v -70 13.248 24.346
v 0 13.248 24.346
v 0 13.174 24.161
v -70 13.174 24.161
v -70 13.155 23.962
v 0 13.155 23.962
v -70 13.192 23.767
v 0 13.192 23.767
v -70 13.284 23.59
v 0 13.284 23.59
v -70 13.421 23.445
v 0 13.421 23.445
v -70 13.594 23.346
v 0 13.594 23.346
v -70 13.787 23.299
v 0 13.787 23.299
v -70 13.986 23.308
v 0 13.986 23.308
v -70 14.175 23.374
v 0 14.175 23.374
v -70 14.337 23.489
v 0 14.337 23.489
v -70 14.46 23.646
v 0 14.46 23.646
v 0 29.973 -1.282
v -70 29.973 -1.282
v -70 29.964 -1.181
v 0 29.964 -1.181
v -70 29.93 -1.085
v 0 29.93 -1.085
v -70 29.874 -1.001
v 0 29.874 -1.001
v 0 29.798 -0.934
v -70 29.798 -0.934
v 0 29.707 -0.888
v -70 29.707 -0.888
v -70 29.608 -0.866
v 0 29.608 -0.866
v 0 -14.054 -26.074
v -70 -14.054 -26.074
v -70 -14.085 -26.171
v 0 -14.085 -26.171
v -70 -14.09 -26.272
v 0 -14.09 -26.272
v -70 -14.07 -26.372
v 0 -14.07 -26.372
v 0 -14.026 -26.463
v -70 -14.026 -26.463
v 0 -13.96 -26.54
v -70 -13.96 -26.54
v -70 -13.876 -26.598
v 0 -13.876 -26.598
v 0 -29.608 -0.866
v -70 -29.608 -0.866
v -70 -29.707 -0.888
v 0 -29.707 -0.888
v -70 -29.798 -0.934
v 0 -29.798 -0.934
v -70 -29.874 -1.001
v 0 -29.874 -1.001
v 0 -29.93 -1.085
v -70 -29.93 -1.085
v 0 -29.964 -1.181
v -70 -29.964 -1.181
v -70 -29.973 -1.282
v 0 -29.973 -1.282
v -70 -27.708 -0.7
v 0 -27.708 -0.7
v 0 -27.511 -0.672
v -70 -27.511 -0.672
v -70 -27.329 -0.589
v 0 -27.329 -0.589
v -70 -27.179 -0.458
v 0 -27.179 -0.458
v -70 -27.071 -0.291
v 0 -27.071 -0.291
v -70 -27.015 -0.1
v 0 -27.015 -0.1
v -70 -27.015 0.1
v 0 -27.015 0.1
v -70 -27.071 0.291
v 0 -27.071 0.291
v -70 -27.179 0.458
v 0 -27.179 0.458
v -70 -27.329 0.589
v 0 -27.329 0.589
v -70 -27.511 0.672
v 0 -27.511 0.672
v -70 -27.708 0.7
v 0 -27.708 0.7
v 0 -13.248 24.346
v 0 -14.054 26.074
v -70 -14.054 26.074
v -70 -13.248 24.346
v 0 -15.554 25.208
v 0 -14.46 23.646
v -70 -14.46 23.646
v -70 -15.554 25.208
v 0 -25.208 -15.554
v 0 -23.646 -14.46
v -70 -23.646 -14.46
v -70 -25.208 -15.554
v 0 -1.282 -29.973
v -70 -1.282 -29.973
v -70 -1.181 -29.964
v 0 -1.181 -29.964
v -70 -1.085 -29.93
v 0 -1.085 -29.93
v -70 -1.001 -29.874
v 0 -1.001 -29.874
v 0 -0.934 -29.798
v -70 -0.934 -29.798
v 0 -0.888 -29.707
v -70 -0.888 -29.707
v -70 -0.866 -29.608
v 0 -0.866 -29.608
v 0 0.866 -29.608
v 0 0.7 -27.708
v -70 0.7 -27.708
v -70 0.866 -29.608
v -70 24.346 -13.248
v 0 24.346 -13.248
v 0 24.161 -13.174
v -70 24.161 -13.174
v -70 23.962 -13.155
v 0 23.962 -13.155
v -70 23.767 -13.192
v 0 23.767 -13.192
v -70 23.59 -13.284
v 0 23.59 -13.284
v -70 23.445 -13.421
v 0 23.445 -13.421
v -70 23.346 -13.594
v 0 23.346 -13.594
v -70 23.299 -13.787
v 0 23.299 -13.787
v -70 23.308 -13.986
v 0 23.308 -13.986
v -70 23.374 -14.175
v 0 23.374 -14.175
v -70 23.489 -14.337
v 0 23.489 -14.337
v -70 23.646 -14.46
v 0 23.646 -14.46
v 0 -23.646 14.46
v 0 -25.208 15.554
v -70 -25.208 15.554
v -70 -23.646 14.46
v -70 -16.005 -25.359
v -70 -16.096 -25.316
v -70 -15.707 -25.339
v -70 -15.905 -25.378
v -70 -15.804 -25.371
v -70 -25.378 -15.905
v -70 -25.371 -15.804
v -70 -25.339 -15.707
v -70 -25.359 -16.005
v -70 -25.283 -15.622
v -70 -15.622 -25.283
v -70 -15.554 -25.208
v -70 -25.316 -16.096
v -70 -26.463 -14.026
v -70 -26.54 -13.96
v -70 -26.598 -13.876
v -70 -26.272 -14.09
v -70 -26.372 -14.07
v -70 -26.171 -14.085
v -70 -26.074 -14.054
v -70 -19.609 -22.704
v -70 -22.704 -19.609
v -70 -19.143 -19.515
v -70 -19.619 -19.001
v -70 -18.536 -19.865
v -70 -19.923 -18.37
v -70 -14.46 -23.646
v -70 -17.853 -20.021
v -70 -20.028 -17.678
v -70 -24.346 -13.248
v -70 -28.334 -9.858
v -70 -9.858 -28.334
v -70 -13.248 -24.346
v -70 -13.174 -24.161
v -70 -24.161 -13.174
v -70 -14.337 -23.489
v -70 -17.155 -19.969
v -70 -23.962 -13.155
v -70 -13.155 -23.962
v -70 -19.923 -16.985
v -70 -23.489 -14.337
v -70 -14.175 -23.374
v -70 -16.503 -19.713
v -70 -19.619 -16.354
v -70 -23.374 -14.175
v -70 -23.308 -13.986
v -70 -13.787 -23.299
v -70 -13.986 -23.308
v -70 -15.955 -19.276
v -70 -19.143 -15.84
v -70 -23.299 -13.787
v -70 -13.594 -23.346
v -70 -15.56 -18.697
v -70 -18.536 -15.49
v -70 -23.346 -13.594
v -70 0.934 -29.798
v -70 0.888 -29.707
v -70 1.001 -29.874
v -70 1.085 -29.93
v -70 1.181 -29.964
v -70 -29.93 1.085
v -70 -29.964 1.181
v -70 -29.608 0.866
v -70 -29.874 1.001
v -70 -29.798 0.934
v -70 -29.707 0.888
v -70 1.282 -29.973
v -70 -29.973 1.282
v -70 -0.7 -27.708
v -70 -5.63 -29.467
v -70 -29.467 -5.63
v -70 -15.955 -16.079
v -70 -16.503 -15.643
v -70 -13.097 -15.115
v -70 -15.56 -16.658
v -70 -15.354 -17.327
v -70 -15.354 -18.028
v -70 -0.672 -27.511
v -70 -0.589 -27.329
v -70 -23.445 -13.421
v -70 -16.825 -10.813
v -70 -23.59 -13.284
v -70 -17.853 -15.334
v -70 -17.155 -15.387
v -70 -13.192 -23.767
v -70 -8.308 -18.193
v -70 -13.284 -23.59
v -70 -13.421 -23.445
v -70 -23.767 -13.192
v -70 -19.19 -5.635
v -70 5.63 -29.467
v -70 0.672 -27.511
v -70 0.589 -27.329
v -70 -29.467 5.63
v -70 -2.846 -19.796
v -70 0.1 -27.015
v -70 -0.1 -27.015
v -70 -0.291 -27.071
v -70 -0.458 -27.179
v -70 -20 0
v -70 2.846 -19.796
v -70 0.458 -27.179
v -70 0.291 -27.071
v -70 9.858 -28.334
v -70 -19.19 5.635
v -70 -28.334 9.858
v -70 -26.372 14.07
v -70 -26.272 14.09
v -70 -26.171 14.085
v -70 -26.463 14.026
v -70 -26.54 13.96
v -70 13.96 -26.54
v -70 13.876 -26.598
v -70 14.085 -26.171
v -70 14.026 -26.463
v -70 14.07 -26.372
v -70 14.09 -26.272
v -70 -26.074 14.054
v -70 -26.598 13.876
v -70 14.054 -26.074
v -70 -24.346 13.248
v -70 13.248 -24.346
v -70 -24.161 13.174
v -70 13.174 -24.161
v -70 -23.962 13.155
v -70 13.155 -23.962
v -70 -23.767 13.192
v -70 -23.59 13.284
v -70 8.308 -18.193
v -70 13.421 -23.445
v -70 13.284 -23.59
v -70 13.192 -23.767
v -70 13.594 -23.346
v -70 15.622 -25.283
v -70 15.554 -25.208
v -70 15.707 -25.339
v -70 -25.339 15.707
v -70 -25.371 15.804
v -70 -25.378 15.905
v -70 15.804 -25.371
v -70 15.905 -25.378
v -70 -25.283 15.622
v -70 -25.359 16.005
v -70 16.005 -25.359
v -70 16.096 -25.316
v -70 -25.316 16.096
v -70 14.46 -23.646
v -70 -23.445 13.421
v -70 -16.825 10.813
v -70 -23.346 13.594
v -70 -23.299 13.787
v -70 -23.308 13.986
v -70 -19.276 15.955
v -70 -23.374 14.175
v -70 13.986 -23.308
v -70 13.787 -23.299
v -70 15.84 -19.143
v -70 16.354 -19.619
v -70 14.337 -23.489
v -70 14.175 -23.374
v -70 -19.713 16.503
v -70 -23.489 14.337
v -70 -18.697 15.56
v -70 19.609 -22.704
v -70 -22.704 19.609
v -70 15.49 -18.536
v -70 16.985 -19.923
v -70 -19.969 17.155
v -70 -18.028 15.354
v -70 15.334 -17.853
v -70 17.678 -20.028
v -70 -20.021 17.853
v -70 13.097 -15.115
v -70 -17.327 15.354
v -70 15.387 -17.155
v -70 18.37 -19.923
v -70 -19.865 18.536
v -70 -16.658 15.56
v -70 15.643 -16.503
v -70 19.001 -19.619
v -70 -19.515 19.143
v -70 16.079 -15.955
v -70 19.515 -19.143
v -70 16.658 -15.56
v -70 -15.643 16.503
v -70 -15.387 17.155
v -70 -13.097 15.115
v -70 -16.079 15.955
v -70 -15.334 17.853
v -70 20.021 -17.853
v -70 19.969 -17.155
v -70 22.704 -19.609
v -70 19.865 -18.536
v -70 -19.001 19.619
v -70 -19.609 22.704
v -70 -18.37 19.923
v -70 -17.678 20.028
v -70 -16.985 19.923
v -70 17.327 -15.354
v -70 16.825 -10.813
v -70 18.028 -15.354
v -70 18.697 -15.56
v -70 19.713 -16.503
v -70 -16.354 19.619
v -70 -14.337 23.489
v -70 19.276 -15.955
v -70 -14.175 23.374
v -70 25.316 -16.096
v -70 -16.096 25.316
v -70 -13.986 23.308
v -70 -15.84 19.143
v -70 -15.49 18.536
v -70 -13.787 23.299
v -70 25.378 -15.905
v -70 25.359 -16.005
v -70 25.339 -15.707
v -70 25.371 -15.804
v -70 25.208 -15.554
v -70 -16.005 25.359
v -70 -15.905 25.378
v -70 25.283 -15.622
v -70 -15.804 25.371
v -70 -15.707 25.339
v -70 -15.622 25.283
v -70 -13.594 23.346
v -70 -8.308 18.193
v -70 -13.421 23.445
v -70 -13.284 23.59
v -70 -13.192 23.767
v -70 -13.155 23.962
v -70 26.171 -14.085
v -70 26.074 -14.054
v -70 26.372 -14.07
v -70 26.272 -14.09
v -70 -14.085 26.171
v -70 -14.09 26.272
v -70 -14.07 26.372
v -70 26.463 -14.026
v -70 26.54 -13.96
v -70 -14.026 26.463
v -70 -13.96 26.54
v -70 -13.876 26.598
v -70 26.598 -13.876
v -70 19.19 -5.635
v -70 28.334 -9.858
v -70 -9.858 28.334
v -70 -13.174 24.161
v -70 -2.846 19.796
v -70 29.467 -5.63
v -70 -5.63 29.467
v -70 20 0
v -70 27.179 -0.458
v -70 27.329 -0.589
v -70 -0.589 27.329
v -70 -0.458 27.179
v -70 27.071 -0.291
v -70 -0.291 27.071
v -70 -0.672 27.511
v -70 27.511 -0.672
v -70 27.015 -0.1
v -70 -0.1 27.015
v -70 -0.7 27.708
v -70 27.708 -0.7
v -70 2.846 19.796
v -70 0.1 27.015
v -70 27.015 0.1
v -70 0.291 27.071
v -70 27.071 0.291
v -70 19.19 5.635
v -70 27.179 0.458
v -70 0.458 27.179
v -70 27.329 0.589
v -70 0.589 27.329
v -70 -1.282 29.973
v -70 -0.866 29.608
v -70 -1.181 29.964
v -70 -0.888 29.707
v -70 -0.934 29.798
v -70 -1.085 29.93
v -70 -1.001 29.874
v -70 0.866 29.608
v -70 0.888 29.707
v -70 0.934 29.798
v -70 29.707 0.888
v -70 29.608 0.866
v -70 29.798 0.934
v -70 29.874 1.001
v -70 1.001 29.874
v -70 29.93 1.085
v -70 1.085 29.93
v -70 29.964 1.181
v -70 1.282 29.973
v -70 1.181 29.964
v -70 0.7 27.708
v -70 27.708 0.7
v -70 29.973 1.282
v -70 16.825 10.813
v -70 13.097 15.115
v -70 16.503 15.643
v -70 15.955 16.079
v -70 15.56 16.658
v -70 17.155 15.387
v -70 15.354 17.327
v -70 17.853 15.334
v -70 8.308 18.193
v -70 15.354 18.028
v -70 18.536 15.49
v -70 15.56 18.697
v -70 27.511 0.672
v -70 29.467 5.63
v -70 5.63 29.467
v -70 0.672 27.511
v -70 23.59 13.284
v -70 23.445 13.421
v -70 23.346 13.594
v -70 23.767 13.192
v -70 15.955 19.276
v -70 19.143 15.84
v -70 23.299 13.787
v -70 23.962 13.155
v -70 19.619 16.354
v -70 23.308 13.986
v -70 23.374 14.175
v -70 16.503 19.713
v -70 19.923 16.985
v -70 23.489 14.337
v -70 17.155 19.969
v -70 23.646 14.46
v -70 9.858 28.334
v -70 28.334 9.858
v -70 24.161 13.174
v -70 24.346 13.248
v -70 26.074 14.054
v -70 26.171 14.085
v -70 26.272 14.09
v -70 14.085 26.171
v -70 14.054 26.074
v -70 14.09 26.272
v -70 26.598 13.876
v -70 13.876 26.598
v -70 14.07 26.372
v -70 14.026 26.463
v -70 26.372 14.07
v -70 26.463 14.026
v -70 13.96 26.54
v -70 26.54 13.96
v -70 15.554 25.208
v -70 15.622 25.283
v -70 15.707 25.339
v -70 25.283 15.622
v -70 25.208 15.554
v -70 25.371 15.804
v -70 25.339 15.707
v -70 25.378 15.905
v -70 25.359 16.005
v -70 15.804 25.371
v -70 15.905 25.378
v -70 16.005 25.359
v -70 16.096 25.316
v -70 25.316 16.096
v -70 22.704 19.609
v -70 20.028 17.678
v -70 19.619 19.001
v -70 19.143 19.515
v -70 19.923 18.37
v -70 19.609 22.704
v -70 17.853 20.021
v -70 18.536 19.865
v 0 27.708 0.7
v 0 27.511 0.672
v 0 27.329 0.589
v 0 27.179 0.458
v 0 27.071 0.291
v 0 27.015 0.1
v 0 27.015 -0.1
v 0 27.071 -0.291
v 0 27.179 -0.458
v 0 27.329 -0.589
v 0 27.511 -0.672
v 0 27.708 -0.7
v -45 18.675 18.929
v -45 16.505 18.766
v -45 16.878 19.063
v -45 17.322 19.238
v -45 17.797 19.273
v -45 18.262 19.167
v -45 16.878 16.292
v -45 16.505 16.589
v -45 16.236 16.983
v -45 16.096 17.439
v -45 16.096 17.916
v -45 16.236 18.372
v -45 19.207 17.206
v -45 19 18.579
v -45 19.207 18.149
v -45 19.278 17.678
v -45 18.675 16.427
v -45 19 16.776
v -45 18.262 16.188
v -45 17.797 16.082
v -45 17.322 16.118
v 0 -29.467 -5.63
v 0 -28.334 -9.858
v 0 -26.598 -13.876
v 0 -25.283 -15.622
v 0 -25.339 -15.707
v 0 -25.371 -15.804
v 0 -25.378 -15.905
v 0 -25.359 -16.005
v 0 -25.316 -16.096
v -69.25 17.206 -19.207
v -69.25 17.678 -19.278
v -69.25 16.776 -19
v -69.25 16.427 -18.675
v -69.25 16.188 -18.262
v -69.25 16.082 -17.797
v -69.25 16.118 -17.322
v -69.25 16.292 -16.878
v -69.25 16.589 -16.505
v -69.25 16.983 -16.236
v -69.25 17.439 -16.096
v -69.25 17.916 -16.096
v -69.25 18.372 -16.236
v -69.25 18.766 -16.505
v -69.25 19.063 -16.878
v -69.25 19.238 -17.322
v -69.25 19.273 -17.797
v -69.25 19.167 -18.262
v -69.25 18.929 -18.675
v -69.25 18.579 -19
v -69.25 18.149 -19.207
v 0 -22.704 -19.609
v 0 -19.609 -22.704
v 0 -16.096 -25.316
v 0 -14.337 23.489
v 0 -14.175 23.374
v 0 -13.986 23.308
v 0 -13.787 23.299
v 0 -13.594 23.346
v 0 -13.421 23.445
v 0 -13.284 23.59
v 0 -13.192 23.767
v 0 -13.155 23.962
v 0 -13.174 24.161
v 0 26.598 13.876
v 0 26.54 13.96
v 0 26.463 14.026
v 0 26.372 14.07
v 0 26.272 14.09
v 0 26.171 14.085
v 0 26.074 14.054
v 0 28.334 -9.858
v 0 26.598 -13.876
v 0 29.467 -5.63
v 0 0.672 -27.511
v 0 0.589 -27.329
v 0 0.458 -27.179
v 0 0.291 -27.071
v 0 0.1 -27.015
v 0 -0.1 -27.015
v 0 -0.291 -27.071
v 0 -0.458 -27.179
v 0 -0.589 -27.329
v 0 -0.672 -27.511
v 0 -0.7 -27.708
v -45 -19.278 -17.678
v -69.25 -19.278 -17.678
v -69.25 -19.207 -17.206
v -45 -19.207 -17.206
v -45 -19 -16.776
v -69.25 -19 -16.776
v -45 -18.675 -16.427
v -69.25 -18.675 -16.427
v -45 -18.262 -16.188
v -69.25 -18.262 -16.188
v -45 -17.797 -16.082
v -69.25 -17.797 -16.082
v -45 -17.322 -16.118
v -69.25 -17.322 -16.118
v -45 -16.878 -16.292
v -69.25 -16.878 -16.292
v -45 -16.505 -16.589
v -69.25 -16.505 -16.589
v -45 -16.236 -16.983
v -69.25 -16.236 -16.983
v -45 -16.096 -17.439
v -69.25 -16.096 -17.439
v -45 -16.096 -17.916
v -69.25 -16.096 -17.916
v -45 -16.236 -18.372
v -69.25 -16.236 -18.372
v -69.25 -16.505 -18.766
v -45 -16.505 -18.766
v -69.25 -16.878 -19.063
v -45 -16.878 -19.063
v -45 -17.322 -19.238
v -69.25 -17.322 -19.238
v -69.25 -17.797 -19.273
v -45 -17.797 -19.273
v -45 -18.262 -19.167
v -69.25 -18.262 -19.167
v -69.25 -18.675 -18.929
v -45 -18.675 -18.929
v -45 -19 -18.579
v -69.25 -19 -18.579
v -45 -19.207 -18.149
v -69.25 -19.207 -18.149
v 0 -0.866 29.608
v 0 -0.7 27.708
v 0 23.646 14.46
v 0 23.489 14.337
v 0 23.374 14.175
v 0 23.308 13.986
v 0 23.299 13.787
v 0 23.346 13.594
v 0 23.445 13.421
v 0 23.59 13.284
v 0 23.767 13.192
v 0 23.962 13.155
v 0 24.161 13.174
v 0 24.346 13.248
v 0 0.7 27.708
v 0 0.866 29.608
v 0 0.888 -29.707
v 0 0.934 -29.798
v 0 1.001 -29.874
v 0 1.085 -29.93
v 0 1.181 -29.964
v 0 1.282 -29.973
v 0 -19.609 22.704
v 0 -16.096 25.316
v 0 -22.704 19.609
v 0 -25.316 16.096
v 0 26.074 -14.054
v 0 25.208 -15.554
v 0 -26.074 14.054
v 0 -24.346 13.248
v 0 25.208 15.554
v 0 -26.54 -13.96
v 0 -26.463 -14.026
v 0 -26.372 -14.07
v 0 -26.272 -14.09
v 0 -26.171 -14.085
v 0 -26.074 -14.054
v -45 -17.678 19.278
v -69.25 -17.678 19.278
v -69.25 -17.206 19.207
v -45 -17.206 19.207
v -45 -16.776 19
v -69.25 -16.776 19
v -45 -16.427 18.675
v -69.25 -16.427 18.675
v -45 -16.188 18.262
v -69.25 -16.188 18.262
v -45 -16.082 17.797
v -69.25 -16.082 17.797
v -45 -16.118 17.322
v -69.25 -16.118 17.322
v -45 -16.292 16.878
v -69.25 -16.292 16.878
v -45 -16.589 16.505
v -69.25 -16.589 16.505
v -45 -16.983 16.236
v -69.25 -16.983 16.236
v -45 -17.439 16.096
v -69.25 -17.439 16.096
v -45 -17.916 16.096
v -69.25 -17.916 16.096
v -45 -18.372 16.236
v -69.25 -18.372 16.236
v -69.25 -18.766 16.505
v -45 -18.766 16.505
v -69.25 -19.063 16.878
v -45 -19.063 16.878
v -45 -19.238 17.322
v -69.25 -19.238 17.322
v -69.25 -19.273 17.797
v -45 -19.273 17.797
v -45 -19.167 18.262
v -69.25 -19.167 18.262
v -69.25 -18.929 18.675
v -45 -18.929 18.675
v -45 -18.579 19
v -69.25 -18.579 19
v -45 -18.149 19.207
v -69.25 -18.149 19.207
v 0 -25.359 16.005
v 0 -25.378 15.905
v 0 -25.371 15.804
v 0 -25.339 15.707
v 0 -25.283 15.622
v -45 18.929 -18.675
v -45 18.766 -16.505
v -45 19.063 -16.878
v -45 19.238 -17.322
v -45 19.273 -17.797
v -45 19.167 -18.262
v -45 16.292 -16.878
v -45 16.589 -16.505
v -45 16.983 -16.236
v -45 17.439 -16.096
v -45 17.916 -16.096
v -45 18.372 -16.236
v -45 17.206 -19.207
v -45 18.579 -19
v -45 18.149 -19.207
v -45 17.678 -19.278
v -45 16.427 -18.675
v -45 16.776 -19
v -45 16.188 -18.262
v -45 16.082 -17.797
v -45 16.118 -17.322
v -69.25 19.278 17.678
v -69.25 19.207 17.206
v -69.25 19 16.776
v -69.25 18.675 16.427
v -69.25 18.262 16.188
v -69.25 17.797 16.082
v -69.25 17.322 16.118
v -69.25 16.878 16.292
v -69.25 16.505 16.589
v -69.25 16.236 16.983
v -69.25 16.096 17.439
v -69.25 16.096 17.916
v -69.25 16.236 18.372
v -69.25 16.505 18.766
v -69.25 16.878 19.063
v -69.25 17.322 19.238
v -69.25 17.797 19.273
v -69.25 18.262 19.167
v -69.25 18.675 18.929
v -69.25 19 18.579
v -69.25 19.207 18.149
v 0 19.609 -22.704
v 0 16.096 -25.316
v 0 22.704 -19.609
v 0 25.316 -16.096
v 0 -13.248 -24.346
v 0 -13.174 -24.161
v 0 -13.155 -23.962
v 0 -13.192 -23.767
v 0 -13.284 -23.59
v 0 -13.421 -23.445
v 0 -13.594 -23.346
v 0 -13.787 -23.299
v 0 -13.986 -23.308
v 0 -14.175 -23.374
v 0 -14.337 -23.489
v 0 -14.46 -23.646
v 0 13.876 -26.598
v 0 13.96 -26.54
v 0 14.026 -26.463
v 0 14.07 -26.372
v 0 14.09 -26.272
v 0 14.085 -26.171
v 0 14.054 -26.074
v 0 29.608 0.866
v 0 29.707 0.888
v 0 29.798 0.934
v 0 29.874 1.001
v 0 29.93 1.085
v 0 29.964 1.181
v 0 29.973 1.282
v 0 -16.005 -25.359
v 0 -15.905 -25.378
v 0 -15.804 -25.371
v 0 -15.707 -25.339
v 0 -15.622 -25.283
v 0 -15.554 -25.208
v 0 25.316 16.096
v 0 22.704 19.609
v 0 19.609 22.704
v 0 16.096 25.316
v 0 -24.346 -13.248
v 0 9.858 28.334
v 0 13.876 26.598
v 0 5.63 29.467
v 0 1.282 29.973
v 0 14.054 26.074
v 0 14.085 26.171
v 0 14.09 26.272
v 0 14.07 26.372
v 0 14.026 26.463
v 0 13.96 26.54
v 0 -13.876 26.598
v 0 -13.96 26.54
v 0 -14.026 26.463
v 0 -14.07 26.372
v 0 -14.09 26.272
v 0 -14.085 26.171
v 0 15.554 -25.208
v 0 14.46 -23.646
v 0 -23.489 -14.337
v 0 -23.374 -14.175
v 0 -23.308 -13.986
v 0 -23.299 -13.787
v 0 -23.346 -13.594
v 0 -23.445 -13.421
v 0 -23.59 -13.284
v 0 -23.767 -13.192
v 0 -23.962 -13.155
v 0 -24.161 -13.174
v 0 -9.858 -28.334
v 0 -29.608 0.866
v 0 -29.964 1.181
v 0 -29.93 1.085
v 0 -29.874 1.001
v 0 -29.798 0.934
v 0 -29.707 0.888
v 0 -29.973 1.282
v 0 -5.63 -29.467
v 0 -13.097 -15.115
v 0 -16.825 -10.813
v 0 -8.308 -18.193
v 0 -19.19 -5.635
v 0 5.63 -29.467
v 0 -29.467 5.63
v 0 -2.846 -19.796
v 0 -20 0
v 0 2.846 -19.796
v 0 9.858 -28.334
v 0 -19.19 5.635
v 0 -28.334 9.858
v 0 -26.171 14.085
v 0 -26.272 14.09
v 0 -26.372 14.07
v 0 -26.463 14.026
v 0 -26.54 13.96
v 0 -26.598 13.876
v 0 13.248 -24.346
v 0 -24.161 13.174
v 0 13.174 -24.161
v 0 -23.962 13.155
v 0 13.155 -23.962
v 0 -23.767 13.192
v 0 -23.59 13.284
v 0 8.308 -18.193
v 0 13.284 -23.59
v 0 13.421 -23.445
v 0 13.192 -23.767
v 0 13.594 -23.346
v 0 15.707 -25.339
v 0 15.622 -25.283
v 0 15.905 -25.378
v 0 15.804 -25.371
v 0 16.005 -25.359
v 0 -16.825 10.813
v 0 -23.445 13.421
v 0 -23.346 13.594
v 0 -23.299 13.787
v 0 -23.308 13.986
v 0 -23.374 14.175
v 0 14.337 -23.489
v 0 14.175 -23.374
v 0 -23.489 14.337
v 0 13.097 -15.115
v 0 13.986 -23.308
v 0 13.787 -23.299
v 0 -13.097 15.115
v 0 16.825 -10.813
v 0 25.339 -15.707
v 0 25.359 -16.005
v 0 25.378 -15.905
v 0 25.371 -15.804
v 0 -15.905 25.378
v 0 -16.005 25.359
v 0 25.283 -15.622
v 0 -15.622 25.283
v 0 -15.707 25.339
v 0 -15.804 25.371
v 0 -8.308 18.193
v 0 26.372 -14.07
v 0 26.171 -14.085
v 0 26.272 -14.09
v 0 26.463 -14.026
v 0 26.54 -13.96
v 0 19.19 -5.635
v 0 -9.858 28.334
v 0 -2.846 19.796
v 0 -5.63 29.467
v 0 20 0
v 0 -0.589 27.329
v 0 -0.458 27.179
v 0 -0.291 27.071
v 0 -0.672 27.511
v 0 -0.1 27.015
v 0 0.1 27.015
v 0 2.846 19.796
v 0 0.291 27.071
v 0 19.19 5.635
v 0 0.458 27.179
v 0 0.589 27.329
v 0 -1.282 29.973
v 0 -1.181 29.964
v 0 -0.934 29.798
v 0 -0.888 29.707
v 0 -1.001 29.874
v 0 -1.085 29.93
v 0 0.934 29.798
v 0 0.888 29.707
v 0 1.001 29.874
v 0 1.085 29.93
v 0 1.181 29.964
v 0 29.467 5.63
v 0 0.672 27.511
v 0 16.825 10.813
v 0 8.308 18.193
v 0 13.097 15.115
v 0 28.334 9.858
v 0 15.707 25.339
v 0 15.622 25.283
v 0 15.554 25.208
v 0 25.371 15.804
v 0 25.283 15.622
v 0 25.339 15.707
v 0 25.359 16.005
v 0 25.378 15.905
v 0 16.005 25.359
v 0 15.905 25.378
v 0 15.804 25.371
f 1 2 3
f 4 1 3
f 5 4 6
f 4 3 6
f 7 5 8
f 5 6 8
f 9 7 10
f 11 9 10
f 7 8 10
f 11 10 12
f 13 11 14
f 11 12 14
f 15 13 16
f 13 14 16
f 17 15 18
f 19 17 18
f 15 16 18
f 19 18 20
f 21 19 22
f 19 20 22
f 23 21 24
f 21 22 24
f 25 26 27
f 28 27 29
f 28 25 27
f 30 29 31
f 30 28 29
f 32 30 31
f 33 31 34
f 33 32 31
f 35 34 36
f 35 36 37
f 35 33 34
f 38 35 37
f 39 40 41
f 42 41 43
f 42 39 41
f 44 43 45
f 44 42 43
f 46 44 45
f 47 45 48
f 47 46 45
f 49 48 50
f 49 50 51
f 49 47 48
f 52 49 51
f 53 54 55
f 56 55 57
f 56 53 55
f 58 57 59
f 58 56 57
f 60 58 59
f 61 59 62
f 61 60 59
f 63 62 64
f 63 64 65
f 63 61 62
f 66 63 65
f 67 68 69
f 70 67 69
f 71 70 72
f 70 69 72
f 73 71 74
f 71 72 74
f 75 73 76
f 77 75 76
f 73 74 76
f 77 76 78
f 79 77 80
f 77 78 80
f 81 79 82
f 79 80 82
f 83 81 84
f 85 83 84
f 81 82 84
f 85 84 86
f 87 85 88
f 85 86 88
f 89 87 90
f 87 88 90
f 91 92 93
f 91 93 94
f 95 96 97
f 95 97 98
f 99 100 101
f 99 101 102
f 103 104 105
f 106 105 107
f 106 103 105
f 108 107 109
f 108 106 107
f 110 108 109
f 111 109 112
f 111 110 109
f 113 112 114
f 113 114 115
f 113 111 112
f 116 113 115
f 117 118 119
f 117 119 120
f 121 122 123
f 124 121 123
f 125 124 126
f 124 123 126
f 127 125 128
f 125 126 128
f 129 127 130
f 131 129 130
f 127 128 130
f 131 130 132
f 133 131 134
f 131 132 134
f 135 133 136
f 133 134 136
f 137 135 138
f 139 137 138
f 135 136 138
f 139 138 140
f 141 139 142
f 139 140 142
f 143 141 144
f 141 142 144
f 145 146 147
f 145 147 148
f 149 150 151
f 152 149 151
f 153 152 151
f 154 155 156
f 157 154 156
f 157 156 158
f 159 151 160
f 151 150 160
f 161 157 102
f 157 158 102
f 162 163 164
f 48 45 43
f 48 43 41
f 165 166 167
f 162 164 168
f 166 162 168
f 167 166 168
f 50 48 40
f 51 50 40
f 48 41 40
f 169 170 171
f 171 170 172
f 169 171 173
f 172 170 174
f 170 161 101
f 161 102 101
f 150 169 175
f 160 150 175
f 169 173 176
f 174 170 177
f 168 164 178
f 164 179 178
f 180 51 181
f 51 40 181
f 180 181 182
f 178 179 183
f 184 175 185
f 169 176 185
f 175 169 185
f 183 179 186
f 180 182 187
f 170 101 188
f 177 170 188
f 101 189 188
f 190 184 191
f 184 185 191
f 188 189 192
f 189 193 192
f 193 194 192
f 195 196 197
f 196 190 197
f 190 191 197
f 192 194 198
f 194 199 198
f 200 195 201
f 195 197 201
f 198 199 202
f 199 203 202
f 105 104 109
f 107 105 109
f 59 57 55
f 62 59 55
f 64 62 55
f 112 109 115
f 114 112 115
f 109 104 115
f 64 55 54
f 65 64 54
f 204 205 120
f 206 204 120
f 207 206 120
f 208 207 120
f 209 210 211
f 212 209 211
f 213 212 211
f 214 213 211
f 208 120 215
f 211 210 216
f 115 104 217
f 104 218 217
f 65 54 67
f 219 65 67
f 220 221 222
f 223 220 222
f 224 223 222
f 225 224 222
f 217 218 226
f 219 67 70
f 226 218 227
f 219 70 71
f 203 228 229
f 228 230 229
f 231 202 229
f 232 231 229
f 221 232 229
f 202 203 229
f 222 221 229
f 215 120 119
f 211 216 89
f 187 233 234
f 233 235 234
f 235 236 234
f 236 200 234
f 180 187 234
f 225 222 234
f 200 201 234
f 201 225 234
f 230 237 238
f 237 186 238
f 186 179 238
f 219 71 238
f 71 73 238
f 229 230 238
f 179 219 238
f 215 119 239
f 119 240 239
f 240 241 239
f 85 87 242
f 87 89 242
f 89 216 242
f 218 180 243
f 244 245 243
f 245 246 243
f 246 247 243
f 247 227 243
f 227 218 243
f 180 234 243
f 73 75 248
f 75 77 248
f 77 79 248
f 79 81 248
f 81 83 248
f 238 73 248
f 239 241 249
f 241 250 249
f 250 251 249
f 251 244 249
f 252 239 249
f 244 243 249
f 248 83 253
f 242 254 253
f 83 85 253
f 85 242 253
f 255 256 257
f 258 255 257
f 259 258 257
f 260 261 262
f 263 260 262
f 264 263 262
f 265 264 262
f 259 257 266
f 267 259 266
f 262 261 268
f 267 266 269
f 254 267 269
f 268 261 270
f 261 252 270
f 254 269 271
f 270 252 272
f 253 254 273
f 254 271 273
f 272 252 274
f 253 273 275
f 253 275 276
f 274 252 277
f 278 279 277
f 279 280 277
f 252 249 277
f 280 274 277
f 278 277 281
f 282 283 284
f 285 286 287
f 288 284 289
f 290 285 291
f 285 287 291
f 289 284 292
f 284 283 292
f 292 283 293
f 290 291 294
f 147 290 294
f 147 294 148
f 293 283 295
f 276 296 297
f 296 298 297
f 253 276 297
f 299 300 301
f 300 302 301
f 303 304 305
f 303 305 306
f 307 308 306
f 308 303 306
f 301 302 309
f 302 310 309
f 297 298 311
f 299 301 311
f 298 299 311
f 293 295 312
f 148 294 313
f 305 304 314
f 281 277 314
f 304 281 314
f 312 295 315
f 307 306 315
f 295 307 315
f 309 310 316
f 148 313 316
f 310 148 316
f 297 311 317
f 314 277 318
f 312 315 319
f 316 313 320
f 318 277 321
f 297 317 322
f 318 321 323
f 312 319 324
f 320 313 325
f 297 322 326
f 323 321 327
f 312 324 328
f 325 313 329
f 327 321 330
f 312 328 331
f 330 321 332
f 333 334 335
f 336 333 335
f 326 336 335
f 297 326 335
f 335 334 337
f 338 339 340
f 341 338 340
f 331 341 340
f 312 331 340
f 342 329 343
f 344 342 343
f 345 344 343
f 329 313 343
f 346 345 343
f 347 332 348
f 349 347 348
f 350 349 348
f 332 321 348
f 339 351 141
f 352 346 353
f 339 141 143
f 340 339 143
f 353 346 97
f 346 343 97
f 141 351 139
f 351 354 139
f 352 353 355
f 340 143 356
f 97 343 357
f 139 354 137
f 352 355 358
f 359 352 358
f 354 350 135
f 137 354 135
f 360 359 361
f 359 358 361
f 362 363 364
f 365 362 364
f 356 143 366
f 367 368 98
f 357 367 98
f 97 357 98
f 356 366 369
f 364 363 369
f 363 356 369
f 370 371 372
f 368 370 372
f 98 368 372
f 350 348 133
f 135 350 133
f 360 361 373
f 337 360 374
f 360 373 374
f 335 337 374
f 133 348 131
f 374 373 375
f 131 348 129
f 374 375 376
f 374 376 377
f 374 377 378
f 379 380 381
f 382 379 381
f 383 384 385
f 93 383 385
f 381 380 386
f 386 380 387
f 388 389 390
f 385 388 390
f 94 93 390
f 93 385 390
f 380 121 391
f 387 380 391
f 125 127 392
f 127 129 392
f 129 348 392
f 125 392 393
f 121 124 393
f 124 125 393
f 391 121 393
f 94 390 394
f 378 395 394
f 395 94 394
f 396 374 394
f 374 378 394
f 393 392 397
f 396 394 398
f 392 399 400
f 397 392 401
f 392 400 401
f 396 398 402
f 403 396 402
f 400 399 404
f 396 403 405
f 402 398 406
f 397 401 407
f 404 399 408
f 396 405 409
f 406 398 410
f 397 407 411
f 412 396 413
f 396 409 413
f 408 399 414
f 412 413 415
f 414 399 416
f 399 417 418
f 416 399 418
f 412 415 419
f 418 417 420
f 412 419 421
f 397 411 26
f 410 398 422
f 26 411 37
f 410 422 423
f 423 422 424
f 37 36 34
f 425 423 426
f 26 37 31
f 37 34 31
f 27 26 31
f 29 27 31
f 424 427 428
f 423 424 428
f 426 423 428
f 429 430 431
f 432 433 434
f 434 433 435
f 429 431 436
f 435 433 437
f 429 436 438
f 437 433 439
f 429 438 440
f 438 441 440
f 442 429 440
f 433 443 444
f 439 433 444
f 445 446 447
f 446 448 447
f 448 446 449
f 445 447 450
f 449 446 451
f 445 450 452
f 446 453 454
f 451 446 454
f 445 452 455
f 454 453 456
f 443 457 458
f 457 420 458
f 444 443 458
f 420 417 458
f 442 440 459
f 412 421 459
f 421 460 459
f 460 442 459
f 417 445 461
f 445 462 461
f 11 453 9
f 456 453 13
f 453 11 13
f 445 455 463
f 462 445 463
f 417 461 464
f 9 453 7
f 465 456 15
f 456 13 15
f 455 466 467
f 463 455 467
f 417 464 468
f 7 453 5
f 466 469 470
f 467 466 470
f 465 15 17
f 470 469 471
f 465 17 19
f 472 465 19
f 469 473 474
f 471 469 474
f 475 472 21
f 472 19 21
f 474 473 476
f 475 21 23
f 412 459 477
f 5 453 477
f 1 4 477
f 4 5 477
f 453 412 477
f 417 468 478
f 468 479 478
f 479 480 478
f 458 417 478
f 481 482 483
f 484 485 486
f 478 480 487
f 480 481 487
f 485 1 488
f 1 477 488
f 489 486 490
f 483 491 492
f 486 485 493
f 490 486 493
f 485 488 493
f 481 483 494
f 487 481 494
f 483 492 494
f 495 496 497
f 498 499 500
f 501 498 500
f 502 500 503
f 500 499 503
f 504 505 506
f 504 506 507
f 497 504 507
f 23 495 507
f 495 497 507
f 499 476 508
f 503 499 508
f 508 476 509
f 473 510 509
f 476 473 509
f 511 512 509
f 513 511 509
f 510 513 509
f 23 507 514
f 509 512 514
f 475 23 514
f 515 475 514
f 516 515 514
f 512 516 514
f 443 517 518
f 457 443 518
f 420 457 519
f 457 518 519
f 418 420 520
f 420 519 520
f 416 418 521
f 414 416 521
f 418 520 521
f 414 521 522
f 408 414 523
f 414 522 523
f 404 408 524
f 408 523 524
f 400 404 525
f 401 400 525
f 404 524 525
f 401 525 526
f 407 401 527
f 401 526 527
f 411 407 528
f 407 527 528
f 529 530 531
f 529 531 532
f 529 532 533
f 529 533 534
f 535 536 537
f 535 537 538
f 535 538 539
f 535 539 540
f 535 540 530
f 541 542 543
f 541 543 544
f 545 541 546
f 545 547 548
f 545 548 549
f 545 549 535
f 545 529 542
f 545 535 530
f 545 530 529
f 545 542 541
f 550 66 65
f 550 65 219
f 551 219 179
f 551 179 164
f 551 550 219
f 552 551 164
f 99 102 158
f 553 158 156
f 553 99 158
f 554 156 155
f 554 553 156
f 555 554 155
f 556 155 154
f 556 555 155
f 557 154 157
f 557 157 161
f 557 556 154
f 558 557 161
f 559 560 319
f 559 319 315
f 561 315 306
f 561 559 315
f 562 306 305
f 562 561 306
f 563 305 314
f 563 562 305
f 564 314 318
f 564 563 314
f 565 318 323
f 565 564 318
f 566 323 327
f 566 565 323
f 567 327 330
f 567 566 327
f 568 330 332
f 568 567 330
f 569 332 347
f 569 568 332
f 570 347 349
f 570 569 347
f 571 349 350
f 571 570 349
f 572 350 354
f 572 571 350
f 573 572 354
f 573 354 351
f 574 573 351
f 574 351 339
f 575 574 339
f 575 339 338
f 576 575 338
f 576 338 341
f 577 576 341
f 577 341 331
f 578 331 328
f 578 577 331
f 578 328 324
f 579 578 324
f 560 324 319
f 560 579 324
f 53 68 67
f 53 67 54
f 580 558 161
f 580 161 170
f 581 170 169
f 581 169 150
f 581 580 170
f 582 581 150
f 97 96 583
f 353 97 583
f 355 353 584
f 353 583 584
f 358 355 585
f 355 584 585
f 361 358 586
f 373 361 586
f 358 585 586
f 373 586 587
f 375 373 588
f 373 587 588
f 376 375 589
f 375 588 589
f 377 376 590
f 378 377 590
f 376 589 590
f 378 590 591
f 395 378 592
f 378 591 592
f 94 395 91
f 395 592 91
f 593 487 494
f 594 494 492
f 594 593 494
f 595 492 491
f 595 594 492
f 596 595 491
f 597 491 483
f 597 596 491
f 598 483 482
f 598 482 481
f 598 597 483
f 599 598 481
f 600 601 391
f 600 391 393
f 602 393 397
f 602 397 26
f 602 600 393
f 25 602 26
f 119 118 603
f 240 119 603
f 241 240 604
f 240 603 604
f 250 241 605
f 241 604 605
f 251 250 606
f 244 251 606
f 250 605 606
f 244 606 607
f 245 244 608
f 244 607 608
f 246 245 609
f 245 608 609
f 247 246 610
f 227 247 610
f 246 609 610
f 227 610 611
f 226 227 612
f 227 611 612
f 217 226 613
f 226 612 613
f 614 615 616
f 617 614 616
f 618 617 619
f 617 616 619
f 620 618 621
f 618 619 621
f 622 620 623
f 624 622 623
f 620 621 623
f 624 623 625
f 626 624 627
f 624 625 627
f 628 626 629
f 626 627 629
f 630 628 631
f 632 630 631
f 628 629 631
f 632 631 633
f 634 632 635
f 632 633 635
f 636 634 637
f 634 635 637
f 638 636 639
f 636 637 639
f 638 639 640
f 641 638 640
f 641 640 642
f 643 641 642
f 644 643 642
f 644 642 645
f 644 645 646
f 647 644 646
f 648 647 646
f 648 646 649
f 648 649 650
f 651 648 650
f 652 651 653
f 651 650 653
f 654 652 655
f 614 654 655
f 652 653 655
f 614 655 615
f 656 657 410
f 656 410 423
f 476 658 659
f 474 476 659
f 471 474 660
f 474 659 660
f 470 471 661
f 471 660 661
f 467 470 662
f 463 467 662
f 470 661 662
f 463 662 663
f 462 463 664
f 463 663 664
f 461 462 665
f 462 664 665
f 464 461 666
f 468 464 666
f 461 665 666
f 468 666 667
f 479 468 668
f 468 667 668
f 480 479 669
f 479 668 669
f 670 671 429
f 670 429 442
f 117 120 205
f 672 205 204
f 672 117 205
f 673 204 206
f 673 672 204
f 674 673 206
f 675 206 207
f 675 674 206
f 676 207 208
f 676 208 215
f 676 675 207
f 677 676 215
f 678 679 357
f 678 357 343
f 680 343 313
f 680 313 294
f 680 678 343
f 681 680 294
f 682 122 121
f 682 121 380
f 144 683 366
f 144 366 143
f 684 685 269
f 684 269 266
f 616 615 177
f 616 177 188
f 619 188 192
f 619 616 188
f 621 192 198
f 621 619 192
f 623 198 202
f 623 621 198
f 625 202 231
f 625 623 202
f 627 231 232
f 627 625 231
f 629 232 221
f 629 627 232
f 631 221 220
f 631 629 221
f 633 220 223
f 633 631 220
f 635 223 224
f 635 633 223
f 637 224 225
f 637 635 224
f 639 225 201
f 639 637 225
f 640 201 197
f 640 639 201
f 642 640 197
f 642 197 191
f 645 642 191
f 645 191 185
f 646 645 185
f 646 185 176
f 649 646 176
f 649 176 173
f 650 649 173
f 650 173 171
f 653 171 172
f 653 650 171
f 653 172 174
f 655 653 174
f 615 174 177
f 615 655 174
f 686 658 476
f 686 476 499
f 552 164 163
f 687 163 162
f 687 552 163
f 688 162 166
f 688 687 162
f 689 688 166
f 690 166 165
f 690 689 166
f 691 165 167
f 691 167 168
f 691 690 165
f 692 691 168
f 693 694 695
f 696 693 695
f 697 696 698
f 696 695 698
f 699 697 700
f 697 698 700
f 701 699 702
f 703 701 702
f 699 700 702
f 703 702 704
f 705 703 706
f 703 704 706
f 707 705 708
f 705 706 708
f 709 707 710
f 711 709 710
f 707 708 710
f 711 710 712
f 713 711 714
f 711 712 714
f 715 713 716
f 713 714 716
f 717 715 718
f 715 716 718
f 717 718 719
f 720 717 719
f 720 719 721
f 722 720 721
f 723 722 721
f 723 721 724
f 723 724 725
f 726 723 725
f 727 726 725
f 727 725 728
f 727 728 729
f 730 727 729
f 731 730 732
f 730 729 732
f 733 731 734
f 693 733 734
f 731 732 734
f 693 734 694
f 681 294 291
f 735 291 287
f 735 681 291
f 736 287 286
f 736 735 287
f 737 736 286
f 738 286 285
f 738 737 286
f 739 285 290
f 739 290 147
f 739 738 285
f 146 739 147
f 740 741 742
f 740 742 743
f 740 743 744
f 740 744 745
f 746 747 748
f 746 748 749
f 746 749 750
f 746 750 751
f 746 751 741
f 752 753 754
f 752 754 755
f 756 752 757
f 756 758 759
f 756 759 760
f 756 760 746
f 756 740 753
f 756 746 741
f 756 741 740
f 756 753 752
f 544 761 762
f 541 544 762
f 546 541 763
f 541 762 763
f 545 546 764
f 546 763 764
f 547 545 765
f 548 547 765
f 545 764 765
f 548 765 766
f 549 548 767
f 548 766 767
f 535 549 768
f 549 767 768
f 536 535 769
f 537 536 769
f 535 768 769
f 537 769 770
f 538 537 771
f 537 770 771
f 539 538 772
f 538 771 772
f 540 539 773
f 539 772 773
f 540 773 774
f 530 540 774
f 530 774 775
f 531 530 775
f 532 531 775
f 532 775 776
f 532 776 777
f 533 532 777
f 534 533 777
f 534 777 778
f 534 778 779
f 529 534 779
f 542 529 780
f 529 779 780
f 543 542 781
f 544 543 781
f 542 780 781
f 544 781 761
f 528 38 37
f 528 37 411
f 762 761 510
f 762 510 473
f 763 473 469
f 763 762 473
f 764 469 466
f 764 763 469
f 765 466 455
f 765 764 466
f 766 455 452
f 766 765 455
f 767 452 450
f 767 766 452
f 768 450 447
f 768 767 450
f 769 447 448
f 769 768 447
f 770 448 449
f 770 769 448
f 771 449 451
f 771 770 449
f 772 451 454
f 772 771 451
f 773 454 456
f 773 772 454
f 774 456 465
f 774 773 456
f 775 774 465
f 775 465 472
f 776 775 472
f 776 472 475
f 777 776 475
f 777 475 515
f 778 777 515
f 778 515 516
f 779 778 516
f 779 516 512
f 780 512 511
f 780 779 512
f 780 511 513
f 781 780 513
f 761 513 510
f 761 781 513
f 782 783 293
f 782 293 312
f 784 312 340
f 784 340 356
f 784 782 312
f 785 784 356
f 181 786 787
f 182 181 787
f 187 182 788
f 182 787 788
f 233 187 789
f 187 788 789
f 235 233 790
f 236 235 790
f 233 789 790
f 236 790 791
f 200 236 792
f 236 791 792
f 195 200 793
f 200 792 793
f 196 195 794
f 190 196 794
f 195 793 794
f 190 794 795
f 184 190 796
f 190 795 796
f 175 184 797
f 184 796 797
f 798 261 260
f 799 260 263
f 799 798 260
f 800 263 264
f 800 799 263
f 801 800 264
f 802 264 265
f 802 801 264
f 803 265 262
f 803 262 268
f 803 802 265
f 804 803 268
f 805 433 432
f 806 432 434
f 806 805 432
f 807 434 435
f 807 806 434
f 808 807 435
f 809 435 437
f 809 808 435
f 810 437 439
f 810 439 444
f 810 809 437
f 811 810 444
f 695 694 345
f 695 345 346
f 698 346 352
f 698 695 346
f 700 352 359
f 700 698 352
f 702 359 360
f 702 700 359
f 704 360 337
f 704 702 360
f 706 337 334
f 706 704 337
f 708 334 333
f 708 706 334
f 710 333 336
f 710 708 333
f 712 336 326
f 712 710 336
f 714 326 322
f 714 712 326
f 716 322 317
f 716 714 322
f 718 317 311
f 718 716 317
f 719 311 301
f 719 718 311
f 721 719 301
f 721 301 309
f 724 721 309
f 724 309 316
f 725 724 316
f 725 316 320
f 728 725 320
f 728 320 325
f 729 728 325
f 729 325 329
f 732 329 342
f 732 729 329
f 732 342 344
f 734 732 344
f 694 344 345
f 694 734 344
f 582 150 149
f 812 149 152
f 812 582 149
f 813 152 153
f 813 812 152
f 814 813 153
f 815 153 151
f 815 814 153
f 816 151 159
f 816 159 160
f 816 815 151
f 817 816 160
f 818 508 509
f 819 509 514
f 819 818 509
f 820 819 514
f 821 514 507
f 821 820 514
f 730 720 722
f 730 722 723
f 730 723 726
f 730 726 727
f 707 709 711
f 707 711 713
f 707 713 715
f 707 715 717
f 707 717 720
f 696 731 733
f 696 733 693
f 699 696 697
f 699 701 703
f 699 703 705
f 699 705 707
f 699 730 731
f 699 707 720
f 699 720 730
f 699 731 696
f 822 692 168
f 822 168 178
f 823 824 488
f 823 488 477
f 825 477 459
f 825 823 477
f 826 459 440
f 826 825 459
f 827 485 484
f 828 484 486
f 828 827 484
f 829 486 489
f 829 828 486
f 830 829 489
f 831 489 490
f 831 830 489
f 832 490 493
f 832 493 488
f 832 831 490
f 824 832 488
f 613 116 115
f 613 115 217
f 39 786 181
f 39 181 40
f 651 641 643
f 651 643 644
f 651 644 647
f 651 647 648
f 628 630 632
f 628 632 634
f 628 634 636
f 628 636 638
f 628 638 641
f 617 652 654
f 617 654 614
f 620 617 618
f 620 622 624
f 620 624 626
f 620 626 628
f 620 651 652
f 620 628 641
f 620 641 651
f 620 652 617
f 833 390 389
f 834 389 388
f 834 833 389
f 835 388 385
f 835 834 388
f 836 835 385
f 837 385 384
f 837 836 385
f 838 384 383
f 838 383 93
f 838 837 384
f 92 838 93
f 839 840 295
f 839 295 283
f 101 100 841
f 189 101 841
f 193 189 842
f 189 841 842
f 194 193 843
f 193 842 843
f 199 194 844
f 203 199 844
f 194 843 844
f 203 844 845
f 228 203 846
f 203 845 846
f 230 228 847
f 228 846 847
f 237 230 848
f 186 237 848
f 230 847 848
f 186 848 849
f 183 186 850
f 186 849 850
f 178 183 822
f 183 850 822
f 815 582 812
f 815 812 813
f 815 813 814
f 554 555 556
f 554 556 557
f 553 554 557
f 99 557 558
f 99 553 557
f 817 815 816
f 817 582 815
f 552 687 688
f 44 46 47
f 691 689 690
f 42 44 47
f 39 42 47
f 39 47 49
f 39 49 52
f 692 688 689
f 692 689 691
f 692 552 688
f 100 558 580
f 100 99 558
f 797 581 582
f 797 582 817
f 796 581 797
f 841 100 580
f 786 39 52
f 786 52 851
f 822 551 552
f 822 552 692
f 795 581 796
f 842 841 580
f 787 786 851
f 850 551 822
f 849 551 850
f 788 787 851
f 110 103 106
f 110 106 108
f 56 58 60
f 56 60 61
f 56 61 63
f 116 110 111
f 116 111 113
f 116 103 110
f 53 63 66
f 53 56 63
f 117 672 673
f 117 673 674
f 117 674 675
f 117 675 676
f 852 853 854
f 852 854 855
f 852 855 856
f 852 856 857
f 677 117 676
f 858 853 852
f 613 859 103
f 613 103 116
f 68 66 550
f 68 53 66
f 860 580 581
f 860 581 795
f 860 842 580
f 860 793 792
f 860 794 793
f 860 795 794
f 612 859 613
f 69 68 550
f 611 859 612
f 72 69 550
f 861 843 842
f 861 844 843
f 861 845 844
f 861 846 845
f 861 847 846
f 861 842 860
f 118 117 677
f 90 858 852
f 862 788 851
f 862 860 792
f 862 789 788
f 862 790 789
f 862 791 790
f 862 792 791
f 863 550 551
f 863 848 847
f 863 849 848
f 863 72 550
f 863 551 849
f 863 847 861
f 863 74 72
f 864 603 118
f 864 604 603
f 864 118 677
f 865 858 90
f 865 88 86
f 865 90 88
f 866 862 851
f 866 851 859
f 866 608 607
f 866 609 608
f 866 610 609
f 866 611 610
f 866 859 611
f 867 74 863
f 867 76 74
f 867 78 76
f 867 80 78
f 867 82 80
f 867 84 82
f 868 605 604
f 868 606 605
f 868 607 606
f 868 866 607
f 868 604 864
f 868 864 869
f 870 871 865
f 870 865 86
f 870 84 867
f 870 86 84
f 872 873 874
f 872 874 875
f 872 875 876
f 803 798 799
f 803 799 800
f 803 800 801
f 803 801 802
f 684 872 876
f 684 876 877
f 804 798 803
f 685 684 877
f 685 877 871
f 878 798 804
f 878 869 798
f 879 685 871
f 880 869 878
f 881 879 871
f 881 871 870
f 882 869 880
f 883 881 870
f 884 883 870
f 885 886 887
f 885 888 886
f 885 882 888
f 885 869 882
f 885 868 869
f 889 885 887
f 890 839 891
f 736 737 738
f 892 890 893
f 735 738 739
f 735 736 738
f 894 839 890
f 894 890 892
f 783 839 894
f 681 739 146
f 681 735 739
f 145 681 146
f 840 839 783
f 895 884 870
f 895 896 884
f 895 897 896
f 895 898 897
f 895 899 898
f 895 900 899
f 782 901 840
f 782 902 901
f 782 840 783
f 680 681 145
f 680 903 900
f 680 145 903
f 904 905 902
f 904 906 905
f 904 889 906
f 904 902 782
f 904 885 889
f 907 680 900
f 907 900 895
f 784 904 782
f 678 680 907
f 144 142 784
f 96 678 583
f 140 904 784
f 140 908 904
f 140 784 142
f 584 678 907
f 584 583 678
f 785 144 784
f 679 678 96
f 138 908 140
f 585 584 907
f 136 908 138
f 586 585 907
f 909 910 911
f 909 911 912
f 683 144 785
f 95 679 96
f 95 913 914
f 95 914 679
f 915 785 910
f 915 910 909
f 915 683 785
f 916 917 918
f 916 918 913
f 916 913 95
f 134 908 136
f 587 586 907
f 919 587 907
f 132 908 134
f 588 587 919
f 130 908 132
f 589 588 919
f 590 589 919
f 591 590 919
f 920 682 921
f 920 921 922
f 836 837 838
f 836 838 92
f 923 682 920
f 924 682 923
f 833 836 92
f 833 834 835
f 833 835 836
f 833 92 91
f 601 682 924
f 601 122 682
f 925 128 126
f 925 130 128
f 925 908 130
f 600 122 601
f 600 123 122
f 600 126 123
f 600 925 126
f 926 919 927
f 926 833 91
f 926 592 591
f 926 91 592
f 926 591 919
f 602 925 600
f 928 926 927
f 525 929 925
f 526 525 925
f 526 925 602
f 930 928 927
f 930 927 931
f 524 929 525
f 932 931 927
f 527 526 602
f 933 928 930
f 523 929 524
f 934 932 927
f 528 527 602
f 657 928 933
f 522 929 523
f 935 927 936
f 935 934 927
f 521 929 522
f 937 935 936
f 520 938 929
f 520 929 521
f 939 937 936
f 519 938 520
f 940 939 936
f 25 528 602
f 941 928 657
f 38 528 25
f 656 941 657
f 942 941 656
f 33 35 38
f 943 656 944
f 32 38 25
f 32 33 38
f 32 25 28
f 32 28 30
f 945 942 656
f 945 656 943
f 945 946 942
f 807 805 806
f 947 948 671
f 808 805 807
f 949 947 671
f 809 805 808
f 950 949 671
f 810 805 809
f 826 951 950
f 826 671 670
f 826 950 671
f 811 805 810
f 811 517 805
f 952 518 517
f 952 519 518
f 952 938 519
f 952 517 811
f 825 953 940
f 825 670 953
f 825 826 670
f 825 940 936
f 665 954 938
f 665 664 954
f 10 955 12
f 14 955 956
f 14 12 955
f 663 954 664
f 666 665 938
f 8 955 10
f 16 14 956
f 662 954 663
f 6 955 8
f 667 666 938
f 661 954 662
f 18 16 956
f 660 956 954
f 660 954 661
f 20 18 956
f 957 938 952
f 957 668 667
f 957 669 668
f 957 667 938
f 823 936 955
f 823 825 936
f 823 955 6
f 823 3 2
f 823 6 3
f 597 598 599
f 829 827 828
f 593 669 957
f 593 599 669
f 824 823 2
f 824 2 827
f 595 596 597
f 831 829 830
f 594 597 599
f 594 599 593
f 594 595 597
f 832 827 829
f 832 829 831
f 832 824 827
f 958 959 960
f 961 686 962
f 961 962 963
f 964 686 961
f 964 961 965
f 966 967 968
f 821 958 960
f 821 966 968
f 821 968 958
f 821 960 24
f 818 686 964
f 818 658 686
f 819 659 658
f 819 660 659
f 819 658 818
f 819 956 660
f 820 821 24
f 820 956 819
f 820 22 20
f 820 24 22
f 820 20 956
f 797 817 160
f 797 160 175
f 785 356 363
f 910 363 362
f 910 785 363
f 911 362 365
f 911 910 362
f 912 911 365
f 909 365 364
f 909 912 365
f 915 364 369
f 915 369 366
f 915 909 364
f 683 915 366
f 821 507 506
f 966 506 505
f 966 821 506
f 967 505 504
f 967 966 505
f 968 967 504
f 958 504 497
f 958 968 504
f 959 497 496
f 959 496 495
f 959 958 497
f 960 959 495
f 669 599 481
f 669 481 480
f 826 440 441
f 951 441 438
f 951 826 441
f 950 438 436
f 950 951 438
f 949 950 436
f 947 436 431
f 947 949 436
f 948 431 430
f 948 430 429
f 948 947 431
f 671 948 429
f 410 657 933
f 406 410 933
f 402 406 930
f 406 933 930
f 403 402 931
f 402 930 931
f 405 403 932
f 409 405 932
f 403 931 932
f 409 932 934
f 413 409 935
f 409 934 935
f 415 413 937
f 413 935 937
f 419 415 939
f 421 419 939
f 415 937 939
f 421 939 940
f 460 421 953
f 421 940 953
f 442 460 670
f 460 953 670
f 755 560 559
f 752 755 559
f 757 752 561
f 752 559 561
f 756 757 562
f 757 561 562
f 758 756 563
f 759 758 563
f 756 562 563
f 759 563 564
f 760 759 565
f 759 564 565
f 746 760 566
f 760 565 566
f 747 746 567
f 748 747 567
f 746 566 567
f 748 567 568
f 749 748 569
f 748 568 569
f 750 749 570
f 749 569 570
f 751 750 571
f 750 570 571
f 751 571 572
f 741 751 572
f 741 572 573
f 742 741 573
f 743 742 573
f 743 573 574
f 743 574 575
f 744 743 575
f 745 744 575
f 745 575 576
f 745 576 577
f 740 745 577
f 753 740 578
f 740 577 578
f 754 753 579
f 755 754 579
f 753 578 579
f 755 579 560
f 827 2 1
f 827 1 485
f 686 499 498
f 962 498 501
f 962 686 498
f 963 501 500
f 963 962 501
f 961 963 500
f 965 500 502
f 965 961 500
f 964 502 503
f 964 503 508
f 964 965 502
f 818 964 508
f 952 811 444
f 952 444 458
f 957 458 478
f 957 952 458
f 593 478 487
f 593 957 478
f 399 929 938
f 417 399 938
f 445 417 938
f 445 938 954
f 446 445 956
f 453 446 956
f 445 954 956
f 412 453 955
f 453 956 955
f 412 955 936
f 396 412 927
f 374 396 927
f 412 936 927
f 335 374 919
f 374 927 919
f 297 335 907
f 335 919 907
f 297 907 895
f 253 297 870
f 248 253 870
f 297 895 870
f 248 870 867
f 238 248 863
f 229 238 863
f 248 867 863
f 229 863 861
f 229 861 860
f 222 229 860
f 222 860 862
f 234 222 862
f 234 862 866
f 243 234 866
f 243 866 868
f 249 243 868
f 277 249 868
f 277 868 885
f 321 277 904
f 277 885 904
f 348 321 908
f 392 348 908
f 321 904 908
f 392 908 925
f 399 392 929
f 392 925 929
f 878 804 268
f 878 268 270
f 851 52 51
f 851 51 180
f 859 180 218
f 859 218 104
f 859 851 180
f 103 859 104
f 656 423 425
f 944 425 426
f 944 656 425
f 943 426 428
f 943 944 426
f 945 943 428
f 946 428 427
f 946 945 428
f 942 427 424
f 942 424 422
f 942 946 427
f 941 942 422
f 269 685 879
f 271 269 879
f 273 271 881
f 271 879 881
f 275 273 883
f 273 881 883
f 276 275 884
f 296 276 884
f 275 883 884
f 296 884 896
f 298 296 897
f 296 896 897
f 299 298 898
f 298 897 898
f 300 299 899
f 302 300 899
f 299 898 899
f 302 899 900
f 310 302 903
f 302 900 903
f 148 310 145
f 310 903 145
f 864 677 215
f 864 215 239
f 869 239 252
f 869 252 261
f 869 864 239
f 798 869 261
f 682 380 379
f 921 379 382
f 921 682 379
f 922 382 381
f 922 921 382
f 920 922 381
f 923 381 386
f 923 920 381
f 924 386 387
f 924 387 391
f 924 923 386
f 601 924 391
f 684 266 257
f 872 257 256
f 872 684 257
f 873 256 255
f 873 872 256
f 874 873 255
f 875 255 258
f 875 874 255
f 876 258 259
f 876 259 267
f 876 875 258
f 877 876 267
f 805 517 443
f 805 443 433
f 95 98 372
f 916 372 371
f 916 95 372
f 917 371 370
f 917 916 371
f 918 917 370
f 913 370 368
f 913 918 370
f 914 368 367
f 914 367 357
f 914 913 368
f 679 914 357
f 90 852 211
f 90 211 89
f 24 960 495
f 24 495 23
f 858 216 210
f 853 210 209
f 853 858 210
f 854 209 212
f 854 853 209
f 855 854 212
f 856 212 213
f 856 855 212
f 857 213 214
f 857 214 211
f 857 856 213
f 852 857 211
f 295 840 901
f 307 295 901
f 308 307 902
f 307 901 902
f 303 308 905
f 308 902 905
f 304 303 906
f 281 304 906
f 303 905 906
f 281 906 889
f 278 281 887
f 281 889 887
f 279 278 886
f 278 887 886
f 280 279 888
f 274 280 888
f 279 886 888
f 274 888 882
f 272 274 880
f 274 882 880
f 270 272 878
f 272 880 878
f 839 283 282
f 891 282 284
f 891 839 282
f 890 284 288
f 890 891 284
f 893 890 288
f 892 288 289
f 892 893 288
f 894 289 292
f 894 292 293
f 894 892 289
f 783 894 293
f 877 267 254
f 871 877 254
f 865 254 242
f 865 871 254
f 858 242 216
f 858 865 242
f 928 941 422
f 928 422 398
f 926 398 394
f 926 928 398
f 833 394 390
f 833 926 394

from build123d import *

# Parameters (mm, degrees)
SKETCH008_R           = 30
SKETCH008_R_2         = 20
PAD002_DEPTH          = 70
POCKET_DEPTH          = 70
POLARPATTERN_COUNT    = 12
SKETCH019_R           = 1.6
POCKET001_DEPTH       = 25
POLARPATTERN002_COUNT = 4
CHAMFER_SIZE          = 0.75


with BuildPart() as part:
    # Sketch008 → Pad002 (new body)
    with BuildSketch(Plane.YZ):
        Circle(SKETCH008_R)
        Circle(SKETCH008_R_2, mode=Mode.SUBTRACT)
    extrude(amount=-PAD002_DEPTH)

    # Sketch009 (on Face3 of Pad002) → Pocket (cut)
    with BuildSketch(Plane.YZ):
        with BuildLine():
            ThreePointArc((29.6078316758, 0.8662284607), (29.8735874261, 1.0008336631), (29.9726041, 1.2817969662))
            ThreePointArc((29.9726041, -1.2817969662), (30, 0), (29.9726041, 1.2817969662))
            ThreePointArc((29.9726041, -1.2817969662), (29.8735874261, -1.0008336631), (29.6078316758, -0.8662284607))
            Line((29.6078316758, -0.8662284607), (27.7078316758, -0.7))
            ThreePointArc((27.7078316758, 0.7), (27.0078316758, 0), (27.7078316758, -0.7))
            Line((27.7078316758, 0.7), (29.6078316758, 0.8662284607))
        make_face()
    pocket = extrude(amount=-POCKET_DEPTH, mode=Mode.SUBTRACT)

    # PolarPattern: Pocket ×12 about axis
    polarpattern_axis = Axis((0, 0, 0), (1, 0, 0))
    for i in range(1, POLARPATTERN_COUNT):
        add(pocket.rotate(polarpattern_axis, i * 360 / POLARPATTERN_COUNT), mode=Mode.SUBTRACT)

    # Sketch019 (on Face4 of PolarPattern) → Pocket001 (cut)
    with BuildSketch(Plane(origin=(-70, 0, 0), x_dir=(0, 1, 0), z_dir=(-1, 0, 0))):
        with Locations((17.6776695297, -17.6776695297)):
            Circle(SKETCH019_R)
    pocket001 = extrude(amount=-POCKET001_DEPTH, mode=Mode.SUBTRACT)

    # PolarPattern002: Pocket001 ×4 about axis
    polarpattern002_axis = Axis((-70, 0, 0), (-1, 0, 0))
    for i in range(1, POLARPATTERN002_COUNT):
        add(pocket001.rotate(polarpattern002_axis, i * 360 / POLARPATTERN002_COUNT), mode=Mode.SUBTRACT)

    # Chamfer
    chamfer_edges = [part.edges().sort_by_distance(p)[0] for p in [
        (-70, 17.67767, -16.07767),
        (-70, -16.07767, -17.67767),
        (-70, -17.67767, 16.07767),
        (-70, 16.07767, 17.67767),
    ]]
    chamfer(chamfer_edges, length=CHAMFER_SIZE)


solid = part.part
